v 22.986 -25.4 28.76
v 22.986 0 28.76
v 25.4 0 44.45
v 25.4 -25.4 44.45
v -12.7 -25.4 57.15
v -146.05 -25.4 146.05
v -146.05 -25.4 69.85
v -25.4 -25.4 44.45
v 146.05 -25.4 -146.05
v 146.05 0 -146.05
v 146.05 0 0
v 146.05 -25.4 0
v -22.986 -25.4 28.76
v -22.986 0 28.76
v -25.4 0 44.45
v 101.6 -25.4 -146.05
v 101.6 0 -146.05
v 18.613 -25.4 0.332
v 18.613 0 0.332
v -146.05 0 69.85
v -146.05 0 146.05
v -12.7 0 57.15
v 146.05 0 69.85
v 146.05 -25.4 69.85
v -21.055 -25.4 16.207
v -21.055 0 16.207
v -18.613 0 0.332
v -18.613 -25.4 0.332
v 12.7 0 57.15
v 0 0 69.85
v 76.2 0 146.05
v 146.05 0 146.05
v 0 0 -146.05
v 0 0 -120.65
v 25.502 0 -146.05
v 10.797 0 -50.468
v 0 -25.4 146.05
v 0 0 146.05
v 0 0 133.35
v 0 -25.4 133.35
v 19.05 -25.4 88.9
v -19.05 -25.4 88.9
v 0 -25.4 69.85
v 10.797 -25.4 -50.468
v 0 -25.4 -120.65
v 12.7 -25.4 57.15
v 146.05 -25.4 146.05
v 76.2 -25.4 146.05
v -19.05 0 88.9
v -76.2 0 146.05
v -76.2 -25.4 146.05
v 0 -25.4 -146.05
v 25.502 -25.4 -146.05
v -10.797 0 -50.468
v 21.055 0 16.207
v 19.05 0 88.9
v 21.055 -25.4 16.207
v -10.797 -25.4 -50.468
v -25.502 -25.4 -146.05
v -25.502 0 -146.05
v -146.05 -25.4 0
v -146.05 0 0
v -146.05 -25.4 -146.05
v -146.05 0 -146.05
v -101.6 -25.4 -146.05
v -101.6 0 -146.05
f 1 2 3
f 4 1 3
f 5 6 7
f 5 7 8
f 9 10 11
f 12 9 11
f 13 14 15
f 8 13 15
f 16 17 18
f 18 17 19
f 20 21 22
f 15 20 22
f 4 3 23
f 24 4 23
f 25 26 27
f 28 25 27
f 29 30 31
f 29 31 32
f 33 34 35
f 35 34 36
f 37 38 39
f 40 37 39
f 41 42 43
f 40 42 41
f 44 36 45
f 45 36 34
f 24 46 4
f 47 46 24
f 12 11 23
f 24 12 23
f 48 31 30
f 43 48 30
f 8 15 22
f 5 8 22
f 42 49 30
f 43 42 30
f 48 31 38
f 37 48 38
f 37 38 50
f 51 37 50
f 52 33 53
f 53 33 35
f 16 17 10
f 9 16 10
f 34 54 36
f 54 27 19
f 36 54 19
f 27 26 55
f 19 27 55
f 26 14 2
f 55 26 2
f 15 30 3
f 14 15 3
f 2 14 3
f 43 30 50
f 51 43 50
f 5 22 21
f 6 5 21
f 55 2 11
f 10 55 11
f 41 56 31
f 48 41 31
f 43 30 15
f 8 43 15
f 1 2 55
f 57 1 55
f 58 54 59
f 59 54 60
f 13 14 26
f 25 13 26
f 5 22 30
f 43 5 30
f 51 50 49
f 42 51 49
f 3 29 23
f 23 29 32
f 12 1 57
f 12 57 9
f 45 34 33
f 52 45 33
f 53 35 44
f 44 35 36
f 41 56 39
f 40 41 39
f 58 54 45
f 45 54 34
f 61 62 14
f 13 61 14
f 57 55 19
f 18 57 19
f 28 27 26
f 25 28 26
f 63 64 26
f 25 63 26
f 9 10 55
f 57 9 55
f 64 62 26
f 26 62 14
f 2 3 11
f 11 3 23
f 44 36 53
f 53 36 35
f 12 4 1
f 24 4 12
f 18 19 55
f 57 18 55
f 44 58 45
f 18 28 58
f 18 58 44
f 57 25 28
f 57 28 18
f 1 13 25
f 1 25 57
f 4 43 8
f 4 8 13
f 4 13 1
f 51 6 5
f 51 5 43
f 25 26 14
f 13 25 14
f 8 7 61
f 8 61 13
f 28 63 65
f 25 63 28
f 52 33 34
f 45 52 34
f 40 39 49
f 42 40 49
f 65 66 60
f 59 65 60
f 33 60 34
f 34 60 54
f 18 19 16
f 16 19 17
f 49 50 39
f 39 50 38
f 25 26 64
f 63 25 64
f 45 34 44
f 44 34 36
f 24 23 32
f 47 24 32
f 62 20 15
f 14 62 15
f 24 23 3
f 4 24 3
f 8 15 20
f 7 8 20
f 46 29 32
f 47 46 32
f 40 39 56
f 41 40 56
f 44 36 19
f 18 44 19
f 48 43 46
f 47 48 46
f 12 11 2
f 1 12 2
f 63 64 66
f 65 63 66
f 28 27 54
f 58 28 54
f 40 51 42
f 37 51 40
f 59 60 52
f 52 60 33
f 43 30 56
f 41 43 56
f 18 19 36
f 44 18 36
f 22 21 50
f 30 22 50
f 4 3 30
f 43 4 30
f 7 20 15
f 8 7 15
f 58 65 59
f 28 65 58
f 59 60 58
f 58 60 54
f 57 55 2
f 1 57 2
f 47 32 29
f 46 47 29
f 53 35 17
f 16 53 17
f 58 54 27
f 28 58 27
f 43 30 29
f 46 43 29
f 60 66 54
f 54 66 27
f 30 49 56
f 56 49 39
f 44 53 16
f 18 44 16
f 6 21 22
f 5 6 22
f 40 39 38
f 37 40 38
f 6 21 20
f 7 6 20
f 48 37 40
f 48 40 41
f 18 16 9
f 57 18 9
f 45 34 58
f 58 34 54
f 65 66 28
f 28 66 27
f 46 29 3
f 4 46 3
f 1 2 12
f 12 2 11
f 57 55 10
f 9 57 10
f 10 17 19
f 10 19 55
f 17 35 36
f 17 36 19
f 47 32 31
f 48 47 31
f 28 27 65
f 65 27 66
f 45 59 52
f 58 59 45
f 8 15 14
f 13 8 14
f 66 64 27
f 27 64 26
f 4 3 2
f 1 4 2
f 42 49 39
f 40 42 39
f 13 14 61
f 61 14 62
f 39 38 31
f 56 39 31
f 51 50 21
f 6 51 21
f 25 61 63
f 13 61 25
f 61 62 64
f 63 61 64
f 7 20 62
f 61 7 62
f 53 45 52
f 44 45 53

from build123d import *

# Parameters (mm, degrees)
F1_DEPTH = 25.4
F2_DEPTH = 25.4
F3_DEPTH = 25.4


with BuildPart() as f1:
    # F0 (on Front) → F1 (new body)
    with BuildSketch(Plane.XZ):
        Polygon((-12.7, 57.15), (-146.05, 146.05), (-146.05, 69.85), (-25.4, 44.45), align=None)
        Polygon((0, 146.05), (-76.2, 146.05), (-19.05, 88.9), (0, 133.35), align=None)
        Polygon((19.05, 88.9), (0, 69.85), (12.7, 57.15), (146.05, 146.05), (76.2, 146.05), align=None)
        Polygon((146.05, 69.85), (25.4, 44.45), (22.986092, 28.759599), (146.05, 0), align=None)
        Polygon((146.05, -146.05), (21.054966, 16.207279), (18.612658, 0.332279), (101.6, -146.05), align=None)
        Polygon((0, -120.65), (0, -146.05), (25.50224, -146.05), (10.797274, -50.467721), align=None)
        Polygon((-18.612658, 0.332279), (-101.6, -146.05), (-25.50224, -146.05), (-10.797274, -50.467721), align=None)
        Polygon((-22.986092, 28.759599), (-146.05, 0), (-146.05, -146.05), (-21.054966, 16.207279), align=None)
    extrude(amount=F1_DEPTH)


with BuildPart() as f2:
    # F0 (on Front) → F2 (new body)
    with BuildSketch(Plane.XZ):
        Polygon((-25.4, 44.45), (-146.05, 69.85), (-146.05, 0), (-22.986092, 28.759599), align=None)
        Polygon((-76.2, 146.05), (-146.05, 146.05), (-12.7, 57.15), (0, 69.85), (-19.05, 88.9), align=None)
        Polygon((76.2, 146.05), (0, 146.05), (0, 133.35), (19.05, 88.9), align=None)
        Polygon((146.05, 146.05), (12.7, 57.15), (25.4, 44.45), (146.05, 69.85), align=None)
        Polygon((146.05, 0), (22.986092, 28.759599), (21.054966, 16.207279), (146.05, -146.05), align=None)
        Polygon((10.797274, -50.467721), (25.50224, -146.05), (101.6, -146.05), (18.612658, 0.332279), align=None)
        Polygon((-10.797274, -50.467721), (-25.50224, -146.05), (0, -146.05), (0, -120.65), align=None)
        Polygon((-21.054966, 16.207279), (-146.05, -146.05), (-101.6, -146.05), (-18.612658, 0.332279), align=None)
    extrude(amount=F2_DEPTH)


with BuildPart() as f3:
    # F0 (on Front) → F3 (new body)
    with BuildSketch(Plane.XZ):
        Polygon((0, 133.35), (-19.05, 88.9), (0, 69.85), (19.05, 88.9), align=None)
        Polygon((0, 69.85), (-12.7, 57.15), (-25.4, 44.45), (-22.986092, 28.759599), (-21.054966, 16.207279), (-18.612658, 0.332279), (-10.797274, -50.467721), (0, -120.65), (10.797274, -50.467721), (18.612658, 0.332279), (21.054966, 16.207279), (22.986092, 28.759599), (25.4, 44.45), (12.7, 57.15), align=None)
    extrude(amount=F3_DEPTH)


solid = Compound([f1.part, f2.part, f3.part])
